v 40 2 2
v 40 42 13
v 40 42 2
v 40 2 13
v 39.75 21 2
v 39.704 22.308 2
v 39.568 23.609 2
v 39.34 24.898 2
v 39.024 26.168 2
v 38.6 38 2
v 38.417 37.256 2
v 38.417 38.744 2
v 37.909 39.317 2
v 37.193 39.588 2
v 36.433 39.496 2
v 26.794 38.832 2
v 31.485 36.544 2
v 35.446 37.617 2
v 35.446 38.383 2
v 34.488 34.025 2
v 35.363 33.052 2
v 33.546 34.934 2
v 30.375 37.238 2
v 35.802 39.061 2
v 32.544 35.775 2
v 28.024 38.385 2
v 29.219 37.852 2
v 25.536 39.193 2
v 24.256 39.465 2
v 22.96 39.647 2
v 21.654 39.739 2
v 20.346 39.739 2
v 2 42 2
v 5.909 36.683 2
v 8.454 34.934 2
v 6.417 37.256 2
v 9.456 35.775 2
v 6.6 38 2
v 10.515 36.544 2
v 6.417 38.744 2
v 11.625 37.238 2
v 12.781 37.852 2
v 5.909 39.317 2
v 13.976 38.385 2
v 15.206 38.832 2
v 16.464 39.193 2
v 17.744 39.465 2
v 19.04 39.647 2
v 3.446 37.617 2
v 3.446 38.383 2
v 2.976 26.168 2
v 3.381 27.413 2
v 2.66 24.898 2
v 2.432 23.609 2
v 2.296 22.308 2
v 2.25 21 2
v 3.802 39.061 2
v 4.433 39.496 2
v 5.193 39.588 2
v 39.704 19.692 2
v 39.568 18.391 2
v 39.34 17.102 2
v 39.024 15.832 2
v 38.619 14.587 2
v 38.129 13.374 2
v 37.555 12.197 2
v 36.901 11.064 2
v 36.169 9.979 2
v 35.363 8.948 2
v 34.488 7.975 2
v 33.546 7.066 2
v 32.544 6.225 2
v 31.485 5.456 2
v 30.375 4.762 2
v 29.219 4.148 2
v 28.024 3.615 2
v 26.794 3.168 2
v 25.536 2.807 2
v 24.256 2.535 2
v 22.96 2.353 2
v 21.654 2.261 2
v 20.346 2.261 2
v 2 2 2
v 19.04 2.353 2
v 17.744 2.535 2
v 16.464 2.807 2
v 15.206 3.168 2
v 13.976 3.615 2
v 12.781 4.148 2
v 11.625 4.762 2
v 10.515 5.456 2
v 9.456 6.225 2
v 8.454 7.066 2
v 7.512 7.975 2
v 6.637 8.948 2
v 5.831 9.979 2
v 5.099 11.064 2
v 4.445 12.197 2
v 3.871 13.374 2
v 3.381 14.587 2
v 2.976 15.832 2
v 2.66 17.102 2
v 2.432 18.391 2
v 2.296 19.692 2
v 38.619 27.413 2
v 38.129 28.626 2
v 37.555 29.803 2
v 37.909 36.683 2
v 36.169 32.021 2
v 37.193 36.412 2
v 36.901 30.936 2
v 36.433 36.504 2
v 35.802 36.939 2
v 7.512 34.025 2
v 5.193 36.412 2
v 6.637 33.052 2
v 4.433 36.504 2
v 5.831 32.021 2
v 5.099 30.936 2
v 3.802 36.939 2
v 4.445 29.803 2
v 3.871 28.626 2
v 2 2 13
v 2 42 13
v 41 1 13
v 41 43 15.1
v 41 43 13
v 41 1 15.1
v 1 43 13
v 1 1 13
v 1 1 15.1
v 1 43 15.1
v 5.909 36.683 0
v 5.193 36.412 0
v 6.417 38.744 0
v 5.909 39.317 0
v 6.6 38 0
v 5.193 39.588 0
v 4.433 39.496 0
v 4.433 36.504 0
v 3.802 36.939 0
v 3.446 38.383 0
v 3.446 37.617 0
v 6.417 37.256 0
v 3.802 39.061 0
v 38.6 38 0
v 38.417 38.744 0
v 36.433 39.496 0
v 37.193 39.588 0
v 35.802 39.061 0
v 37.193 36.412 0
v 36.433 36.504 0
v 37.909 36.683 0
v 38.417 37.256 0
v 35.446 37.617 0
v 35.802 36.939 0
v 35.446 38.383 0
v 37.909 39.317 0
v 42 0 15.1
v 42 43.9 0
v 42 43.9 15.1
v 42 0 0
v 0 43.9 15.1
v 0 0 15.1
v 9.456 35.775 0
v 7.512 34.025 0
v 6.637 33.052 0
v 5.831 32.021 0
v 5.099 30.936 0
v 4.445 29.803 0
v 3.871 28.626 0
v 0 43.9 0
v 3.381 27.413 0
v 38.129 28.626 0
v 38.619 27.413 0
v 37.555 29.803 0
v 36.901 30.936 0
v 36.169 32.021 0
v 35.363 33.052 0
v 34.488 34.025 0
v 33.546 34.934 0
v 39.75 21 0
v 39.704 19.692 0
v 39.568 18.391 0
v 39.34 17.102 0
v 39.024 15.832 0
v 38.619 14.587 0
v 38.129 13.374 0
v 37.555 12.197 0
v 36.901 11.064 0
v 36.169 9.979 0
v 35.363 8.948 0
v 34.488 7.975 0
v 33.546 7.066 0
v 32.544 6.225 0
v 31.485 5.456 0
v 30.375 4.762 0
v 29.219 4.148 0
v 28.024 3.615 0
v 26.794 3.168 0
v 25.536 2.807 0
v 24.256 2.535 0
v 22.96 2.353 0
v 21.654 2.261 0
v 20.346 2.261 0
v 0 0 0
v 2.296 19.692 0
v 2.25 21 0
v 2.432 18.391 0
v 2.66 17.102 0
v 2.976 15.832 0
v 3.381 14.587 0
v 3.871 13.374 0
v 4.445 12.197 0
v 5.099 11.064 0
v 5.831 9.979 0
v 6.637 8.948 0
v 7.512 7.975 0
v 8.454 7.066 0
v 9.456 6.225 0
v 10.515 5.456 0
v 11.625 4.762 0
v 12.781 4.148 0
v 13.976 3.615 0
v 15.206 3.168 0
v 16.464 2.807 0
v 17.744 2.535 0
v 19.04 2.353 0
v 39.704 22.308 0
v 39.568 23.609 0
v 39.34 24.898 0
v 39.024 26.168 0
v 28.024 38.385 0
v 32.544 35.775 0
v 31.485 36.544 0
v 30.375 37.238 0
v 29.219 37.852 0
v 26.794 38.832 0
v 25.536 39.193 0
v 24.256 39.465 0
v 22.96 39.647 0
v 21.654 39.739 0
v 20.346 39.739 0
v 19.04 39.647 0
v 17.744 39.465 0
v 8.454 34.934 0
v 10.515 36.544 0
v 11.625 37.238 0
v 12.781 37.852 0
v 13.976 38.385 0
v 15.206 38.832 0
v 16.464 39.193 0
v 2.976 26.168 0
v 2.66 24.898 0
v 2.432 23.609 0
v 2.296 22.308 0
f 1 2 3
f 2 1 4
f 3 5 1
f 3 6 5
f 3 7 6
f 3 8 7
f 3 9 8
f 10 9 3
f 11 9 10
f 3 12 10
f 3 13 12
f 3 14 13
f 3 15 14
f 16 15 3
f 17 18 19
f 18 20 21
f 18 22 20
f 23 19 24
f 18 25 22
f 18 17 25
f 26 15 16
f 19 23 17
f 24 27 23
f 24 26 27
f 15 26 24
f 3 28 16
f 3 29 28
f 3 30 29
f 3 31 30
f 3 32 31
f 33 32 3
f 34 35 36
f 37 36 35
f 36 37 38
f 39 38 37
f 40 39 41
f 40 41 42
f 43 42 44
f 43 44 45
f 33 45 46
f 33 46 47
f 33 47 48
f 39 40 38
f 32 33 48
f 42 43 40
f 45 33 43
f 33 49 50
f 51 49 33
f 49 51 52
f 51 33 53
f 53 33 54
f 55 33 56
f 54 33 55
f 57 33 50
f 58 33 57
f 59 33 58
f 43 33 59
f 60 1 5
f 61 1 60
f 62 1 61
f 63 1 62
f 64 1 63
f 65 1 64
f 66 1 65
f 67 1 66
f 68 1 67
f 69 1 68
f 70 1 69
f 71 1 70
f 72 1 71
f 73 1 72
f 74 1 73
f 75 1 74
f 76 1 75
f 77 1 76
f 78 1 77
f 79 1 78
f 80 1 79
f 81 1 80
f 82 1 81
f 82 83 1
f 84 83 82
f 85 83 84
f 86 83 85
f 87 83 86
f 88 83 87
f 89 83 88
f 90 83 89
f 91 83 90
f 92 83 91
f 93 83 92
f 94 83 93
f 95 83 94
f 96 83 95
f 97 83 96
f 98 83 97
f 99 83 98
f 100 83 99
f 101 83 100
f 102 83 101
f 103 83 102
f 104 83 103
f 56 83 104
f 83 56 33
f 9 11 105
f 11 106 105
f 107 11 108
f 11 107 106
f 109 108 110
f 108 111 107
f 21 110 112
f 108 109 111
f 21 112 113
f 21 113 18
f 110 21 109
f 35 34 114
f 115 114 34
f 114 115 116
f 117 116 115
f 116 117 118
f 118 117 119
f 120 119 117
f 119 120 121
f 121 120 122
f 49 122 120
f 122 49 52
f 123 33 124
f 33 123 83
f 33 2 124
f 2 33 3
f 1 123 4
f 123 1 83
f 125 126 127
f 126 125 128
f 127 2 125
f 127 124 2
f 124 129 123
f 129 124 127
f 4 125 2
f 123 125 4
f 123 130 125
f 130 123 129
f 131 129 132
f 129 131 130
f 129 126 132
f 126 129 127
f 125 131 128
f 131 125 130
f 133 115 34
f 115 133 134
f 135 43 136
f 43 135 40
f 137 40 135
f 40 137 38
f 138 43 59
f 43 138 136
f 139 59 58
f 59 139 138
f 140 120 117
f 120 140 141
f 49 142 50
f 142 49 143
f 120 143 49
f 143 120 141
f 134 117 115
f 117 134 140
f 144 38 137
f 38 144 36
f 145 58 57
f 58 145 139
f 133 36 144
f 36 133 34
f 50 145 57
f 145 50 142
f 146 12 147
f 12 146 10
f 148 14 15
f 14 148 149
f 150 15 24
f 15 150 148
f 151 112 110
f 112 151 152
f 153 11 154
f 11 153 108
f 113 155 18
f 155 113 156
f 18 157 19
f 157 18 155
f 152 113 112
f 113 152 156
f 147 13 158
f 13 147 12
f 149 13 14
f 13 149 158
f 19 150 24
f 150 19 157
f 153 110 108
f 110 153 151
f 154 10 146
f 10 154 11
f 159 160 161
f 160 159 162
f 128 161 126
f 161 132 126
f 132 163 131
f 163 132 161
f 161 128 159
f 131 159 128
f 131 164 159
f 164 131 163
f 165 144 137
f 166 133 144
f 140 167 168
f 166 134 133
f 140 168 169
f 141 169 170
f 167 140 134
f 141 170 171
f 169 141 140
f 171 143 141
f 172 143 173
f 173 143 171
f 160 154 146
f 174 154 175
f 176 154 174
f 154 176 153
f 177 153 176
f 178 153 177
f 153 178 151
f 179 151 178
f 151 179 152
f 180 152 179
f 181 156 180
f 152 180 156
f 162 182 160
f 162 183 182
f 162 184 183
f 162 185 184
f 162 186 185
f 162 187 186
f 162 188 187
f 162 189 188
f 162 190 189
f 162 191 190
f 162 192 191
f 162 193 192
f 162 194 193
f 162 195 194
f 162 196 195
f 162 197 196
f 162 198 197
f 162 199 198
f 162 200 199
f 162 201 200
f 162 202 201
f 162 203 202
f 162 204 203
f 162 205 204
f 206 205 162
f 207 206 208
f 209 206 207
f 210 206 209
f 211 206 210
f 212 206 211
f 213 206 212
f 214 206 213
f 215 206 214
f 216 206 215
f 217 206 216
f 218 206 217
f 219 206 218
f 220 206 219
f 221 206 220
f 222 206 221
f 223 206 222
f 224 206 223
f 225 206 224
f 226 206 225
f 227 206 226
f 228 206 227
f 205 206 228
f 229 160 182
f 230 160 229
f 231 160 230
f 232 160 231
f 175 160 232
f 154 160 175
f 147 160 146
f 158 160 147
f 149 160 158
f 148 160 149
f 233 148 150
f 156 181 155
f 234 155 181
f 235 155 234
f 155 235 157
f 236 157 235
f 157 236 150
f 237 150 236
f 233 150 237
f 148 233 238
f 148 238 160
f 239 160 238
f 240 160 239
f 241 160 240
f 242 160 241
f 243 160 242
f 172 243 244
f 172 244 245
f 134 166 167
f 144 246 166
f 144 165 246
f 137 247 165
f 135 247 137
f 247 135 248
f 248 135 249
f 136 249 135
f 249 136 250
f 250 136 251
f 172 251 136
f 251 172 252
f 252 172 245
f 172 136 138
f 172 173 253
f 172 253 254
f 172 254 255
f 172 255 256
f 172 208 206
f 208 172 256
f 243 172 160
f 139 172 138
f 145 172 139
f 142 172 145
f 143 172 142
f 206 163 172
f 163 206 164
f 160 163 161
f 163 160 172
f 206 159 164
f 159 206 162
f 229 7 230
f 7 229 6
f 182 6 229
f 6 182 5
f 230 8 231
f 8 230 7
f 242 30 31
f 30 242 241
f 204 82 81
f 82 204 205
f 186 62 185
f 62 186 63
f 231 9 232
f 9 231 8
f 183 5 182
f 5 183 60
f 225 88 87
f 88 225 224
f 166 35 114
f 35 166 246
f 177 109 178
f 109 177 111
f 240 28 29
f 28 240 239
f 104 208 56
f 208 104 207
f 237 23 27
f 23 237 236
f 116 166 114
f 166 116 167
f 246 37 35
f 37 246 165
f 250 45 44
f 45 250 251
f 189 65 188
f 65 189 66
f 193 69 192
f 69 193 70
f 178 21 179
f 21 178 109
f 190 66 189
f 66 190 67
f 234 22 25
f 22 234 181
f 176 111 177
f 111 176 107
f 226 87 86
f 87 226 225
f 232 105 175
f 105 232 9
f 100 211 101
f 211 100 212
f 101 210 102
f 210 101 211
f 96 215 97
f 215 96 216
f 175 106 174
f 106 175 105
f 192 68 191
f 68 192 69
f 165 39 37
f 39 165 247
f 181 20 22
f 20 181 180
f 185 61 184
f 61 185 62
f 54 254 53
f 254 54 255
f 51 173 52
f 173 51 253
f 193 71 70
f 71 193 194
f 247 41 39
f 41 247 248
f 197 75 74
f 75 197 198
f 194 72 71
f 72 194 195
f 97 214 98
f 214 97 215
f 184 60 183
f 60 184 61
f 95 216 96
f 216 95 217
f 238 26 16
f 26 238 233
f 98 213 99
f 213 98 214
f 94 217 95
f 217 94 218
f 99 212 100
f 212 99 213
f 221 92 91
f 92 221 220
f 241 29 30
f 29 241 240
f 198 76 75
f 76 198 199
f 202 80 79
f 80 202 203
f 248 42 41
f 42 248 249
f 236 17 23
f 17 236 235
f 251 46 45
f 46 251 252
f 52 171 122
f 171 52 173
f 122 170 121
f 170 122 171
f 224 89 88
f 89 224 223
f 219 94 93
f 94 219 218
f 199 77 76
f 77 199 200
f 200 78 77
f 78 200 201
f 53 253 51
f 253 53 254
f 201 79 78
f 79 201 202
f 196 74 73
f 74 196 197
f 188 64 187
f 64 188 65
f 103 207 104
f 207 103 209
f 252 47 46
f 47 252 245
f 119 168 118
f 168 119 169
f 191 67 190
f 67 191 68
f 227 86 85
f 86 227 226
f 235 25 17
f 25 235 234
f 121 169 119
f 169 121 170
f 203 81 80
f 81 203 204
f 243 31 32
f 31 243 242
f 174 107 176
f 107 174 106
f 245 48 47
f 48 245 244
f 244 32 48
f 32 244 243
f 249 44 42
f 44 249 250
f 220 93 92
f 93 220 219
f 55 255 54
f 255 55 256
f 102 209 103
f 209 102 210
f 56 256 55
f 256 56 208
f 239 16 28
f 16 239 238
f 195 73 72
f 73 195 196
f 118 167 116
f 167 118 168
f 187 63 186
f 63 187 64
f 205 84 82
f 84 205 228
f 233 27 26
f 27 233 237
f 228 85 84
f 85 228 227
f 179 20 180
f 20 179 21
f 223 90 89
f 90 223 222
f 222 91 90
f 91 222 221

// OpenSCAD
$fs=0.8; // def 1, 0.2 is high res
$fa=4;//def 12, 3 is very nice
%translate([0,0,-0.5])cube([200,200,1],center=true); //build platform

sc = 32; //Screw Centres
wall=2;
hole = 37.5;  //fan hole
x=42;
y=x;
z=15.10;
heo = 2.5; //hot end offset
hbr = 16; //heat block recess

ventB=(x/2)-(hbr/2)+heo-2;
ventS=(x/2)-(hbr/2)-heo;

module sensorMount() {
	difference() {
		union() {
			translate([-3,y-5.5,9]) rotate([0,90,0]) cylinder(4,3,6);	// sensor board mount
			translate([-3,y-28.5,9]) rotate([0,90,0]) cylinder(4,3,6);	// sensor board mount	
		}
		translate([-4,y-5.5,9]) rotate([0,90,0]) cylinder(h=5,r=1.2);	// sensor board hole
		translate([-4,y-28.5,9]) rotate([0,90,0]) cylinder(h=5,r=1.2);	// sensor board hole
	}
}

module heatsink() 
{
	cube([38, 40, 12]); //heatsink hole
	translate([-1,-1,11]) cube([40, 42, 3]); //heatsink recess
	translate([3,36,-2.1]) cylinder(3,1.6,1.6); //screw hole
	translate([35,36,-2.1]) cylinder(3,1.6,1.6); //screw hole
}

module prism(l, w, h) {
	translate([0, l, 0]) rotate( a= [90, 0, 0]) 
	linear_extrude(height = l) polygon(points = [
		[0, 0],
		[w, 0],
		[0, h]
	], paths=[[0,2,1]]);
}

module vHole(len) {
	difference() {
		union() {
			cube([10-6,len,6]);
			translate([10-6,len,6]) rotate([90,0,0]) cylinder(len,6,6);
		}
		translate ([-7,-1,6]) cube([16,len+2,10]);
		translate ([-7,-1,0]) cube([6,len+2,7]);
	}
}

//Body
difference() {
	cube([x,y+1.9,z]); //outer block
	
	translate([x/2,(y/2),-.1]) cylinder(5,hole/2,hole/2); //fan hole
	translate([wall,wall,2]) heatsink();

}

/*/*Cable Traps
translate([x,(y/2)-10,0]) cube([wall*2,20,1.5]); //right cable trap
difference() {
	translate([x+3,(y/2)-10,0]) cube([1.5,20,z]); //right cable trap
	translate([x+2,(y/2)-10,z-2]) rotate([45,0,0]) cube(3); //right cable trap bevel
	translate([x+2,y-11,z-2]) rotate([45,0,0]) cube(3); //right cable trap bevel
}
translate([x+1.6,(y/2)-7.5,z-1.5]) rotate([0,45,0]) cube([2,15,2]); //right cable trap catch

//Tie Wrap T
translate([x/2-2.5,-6,0]) cube([5,6,2]);
translate([x/2-4,-6,0]) cube([8,2,2]);
*/

//sensorMount() ;
